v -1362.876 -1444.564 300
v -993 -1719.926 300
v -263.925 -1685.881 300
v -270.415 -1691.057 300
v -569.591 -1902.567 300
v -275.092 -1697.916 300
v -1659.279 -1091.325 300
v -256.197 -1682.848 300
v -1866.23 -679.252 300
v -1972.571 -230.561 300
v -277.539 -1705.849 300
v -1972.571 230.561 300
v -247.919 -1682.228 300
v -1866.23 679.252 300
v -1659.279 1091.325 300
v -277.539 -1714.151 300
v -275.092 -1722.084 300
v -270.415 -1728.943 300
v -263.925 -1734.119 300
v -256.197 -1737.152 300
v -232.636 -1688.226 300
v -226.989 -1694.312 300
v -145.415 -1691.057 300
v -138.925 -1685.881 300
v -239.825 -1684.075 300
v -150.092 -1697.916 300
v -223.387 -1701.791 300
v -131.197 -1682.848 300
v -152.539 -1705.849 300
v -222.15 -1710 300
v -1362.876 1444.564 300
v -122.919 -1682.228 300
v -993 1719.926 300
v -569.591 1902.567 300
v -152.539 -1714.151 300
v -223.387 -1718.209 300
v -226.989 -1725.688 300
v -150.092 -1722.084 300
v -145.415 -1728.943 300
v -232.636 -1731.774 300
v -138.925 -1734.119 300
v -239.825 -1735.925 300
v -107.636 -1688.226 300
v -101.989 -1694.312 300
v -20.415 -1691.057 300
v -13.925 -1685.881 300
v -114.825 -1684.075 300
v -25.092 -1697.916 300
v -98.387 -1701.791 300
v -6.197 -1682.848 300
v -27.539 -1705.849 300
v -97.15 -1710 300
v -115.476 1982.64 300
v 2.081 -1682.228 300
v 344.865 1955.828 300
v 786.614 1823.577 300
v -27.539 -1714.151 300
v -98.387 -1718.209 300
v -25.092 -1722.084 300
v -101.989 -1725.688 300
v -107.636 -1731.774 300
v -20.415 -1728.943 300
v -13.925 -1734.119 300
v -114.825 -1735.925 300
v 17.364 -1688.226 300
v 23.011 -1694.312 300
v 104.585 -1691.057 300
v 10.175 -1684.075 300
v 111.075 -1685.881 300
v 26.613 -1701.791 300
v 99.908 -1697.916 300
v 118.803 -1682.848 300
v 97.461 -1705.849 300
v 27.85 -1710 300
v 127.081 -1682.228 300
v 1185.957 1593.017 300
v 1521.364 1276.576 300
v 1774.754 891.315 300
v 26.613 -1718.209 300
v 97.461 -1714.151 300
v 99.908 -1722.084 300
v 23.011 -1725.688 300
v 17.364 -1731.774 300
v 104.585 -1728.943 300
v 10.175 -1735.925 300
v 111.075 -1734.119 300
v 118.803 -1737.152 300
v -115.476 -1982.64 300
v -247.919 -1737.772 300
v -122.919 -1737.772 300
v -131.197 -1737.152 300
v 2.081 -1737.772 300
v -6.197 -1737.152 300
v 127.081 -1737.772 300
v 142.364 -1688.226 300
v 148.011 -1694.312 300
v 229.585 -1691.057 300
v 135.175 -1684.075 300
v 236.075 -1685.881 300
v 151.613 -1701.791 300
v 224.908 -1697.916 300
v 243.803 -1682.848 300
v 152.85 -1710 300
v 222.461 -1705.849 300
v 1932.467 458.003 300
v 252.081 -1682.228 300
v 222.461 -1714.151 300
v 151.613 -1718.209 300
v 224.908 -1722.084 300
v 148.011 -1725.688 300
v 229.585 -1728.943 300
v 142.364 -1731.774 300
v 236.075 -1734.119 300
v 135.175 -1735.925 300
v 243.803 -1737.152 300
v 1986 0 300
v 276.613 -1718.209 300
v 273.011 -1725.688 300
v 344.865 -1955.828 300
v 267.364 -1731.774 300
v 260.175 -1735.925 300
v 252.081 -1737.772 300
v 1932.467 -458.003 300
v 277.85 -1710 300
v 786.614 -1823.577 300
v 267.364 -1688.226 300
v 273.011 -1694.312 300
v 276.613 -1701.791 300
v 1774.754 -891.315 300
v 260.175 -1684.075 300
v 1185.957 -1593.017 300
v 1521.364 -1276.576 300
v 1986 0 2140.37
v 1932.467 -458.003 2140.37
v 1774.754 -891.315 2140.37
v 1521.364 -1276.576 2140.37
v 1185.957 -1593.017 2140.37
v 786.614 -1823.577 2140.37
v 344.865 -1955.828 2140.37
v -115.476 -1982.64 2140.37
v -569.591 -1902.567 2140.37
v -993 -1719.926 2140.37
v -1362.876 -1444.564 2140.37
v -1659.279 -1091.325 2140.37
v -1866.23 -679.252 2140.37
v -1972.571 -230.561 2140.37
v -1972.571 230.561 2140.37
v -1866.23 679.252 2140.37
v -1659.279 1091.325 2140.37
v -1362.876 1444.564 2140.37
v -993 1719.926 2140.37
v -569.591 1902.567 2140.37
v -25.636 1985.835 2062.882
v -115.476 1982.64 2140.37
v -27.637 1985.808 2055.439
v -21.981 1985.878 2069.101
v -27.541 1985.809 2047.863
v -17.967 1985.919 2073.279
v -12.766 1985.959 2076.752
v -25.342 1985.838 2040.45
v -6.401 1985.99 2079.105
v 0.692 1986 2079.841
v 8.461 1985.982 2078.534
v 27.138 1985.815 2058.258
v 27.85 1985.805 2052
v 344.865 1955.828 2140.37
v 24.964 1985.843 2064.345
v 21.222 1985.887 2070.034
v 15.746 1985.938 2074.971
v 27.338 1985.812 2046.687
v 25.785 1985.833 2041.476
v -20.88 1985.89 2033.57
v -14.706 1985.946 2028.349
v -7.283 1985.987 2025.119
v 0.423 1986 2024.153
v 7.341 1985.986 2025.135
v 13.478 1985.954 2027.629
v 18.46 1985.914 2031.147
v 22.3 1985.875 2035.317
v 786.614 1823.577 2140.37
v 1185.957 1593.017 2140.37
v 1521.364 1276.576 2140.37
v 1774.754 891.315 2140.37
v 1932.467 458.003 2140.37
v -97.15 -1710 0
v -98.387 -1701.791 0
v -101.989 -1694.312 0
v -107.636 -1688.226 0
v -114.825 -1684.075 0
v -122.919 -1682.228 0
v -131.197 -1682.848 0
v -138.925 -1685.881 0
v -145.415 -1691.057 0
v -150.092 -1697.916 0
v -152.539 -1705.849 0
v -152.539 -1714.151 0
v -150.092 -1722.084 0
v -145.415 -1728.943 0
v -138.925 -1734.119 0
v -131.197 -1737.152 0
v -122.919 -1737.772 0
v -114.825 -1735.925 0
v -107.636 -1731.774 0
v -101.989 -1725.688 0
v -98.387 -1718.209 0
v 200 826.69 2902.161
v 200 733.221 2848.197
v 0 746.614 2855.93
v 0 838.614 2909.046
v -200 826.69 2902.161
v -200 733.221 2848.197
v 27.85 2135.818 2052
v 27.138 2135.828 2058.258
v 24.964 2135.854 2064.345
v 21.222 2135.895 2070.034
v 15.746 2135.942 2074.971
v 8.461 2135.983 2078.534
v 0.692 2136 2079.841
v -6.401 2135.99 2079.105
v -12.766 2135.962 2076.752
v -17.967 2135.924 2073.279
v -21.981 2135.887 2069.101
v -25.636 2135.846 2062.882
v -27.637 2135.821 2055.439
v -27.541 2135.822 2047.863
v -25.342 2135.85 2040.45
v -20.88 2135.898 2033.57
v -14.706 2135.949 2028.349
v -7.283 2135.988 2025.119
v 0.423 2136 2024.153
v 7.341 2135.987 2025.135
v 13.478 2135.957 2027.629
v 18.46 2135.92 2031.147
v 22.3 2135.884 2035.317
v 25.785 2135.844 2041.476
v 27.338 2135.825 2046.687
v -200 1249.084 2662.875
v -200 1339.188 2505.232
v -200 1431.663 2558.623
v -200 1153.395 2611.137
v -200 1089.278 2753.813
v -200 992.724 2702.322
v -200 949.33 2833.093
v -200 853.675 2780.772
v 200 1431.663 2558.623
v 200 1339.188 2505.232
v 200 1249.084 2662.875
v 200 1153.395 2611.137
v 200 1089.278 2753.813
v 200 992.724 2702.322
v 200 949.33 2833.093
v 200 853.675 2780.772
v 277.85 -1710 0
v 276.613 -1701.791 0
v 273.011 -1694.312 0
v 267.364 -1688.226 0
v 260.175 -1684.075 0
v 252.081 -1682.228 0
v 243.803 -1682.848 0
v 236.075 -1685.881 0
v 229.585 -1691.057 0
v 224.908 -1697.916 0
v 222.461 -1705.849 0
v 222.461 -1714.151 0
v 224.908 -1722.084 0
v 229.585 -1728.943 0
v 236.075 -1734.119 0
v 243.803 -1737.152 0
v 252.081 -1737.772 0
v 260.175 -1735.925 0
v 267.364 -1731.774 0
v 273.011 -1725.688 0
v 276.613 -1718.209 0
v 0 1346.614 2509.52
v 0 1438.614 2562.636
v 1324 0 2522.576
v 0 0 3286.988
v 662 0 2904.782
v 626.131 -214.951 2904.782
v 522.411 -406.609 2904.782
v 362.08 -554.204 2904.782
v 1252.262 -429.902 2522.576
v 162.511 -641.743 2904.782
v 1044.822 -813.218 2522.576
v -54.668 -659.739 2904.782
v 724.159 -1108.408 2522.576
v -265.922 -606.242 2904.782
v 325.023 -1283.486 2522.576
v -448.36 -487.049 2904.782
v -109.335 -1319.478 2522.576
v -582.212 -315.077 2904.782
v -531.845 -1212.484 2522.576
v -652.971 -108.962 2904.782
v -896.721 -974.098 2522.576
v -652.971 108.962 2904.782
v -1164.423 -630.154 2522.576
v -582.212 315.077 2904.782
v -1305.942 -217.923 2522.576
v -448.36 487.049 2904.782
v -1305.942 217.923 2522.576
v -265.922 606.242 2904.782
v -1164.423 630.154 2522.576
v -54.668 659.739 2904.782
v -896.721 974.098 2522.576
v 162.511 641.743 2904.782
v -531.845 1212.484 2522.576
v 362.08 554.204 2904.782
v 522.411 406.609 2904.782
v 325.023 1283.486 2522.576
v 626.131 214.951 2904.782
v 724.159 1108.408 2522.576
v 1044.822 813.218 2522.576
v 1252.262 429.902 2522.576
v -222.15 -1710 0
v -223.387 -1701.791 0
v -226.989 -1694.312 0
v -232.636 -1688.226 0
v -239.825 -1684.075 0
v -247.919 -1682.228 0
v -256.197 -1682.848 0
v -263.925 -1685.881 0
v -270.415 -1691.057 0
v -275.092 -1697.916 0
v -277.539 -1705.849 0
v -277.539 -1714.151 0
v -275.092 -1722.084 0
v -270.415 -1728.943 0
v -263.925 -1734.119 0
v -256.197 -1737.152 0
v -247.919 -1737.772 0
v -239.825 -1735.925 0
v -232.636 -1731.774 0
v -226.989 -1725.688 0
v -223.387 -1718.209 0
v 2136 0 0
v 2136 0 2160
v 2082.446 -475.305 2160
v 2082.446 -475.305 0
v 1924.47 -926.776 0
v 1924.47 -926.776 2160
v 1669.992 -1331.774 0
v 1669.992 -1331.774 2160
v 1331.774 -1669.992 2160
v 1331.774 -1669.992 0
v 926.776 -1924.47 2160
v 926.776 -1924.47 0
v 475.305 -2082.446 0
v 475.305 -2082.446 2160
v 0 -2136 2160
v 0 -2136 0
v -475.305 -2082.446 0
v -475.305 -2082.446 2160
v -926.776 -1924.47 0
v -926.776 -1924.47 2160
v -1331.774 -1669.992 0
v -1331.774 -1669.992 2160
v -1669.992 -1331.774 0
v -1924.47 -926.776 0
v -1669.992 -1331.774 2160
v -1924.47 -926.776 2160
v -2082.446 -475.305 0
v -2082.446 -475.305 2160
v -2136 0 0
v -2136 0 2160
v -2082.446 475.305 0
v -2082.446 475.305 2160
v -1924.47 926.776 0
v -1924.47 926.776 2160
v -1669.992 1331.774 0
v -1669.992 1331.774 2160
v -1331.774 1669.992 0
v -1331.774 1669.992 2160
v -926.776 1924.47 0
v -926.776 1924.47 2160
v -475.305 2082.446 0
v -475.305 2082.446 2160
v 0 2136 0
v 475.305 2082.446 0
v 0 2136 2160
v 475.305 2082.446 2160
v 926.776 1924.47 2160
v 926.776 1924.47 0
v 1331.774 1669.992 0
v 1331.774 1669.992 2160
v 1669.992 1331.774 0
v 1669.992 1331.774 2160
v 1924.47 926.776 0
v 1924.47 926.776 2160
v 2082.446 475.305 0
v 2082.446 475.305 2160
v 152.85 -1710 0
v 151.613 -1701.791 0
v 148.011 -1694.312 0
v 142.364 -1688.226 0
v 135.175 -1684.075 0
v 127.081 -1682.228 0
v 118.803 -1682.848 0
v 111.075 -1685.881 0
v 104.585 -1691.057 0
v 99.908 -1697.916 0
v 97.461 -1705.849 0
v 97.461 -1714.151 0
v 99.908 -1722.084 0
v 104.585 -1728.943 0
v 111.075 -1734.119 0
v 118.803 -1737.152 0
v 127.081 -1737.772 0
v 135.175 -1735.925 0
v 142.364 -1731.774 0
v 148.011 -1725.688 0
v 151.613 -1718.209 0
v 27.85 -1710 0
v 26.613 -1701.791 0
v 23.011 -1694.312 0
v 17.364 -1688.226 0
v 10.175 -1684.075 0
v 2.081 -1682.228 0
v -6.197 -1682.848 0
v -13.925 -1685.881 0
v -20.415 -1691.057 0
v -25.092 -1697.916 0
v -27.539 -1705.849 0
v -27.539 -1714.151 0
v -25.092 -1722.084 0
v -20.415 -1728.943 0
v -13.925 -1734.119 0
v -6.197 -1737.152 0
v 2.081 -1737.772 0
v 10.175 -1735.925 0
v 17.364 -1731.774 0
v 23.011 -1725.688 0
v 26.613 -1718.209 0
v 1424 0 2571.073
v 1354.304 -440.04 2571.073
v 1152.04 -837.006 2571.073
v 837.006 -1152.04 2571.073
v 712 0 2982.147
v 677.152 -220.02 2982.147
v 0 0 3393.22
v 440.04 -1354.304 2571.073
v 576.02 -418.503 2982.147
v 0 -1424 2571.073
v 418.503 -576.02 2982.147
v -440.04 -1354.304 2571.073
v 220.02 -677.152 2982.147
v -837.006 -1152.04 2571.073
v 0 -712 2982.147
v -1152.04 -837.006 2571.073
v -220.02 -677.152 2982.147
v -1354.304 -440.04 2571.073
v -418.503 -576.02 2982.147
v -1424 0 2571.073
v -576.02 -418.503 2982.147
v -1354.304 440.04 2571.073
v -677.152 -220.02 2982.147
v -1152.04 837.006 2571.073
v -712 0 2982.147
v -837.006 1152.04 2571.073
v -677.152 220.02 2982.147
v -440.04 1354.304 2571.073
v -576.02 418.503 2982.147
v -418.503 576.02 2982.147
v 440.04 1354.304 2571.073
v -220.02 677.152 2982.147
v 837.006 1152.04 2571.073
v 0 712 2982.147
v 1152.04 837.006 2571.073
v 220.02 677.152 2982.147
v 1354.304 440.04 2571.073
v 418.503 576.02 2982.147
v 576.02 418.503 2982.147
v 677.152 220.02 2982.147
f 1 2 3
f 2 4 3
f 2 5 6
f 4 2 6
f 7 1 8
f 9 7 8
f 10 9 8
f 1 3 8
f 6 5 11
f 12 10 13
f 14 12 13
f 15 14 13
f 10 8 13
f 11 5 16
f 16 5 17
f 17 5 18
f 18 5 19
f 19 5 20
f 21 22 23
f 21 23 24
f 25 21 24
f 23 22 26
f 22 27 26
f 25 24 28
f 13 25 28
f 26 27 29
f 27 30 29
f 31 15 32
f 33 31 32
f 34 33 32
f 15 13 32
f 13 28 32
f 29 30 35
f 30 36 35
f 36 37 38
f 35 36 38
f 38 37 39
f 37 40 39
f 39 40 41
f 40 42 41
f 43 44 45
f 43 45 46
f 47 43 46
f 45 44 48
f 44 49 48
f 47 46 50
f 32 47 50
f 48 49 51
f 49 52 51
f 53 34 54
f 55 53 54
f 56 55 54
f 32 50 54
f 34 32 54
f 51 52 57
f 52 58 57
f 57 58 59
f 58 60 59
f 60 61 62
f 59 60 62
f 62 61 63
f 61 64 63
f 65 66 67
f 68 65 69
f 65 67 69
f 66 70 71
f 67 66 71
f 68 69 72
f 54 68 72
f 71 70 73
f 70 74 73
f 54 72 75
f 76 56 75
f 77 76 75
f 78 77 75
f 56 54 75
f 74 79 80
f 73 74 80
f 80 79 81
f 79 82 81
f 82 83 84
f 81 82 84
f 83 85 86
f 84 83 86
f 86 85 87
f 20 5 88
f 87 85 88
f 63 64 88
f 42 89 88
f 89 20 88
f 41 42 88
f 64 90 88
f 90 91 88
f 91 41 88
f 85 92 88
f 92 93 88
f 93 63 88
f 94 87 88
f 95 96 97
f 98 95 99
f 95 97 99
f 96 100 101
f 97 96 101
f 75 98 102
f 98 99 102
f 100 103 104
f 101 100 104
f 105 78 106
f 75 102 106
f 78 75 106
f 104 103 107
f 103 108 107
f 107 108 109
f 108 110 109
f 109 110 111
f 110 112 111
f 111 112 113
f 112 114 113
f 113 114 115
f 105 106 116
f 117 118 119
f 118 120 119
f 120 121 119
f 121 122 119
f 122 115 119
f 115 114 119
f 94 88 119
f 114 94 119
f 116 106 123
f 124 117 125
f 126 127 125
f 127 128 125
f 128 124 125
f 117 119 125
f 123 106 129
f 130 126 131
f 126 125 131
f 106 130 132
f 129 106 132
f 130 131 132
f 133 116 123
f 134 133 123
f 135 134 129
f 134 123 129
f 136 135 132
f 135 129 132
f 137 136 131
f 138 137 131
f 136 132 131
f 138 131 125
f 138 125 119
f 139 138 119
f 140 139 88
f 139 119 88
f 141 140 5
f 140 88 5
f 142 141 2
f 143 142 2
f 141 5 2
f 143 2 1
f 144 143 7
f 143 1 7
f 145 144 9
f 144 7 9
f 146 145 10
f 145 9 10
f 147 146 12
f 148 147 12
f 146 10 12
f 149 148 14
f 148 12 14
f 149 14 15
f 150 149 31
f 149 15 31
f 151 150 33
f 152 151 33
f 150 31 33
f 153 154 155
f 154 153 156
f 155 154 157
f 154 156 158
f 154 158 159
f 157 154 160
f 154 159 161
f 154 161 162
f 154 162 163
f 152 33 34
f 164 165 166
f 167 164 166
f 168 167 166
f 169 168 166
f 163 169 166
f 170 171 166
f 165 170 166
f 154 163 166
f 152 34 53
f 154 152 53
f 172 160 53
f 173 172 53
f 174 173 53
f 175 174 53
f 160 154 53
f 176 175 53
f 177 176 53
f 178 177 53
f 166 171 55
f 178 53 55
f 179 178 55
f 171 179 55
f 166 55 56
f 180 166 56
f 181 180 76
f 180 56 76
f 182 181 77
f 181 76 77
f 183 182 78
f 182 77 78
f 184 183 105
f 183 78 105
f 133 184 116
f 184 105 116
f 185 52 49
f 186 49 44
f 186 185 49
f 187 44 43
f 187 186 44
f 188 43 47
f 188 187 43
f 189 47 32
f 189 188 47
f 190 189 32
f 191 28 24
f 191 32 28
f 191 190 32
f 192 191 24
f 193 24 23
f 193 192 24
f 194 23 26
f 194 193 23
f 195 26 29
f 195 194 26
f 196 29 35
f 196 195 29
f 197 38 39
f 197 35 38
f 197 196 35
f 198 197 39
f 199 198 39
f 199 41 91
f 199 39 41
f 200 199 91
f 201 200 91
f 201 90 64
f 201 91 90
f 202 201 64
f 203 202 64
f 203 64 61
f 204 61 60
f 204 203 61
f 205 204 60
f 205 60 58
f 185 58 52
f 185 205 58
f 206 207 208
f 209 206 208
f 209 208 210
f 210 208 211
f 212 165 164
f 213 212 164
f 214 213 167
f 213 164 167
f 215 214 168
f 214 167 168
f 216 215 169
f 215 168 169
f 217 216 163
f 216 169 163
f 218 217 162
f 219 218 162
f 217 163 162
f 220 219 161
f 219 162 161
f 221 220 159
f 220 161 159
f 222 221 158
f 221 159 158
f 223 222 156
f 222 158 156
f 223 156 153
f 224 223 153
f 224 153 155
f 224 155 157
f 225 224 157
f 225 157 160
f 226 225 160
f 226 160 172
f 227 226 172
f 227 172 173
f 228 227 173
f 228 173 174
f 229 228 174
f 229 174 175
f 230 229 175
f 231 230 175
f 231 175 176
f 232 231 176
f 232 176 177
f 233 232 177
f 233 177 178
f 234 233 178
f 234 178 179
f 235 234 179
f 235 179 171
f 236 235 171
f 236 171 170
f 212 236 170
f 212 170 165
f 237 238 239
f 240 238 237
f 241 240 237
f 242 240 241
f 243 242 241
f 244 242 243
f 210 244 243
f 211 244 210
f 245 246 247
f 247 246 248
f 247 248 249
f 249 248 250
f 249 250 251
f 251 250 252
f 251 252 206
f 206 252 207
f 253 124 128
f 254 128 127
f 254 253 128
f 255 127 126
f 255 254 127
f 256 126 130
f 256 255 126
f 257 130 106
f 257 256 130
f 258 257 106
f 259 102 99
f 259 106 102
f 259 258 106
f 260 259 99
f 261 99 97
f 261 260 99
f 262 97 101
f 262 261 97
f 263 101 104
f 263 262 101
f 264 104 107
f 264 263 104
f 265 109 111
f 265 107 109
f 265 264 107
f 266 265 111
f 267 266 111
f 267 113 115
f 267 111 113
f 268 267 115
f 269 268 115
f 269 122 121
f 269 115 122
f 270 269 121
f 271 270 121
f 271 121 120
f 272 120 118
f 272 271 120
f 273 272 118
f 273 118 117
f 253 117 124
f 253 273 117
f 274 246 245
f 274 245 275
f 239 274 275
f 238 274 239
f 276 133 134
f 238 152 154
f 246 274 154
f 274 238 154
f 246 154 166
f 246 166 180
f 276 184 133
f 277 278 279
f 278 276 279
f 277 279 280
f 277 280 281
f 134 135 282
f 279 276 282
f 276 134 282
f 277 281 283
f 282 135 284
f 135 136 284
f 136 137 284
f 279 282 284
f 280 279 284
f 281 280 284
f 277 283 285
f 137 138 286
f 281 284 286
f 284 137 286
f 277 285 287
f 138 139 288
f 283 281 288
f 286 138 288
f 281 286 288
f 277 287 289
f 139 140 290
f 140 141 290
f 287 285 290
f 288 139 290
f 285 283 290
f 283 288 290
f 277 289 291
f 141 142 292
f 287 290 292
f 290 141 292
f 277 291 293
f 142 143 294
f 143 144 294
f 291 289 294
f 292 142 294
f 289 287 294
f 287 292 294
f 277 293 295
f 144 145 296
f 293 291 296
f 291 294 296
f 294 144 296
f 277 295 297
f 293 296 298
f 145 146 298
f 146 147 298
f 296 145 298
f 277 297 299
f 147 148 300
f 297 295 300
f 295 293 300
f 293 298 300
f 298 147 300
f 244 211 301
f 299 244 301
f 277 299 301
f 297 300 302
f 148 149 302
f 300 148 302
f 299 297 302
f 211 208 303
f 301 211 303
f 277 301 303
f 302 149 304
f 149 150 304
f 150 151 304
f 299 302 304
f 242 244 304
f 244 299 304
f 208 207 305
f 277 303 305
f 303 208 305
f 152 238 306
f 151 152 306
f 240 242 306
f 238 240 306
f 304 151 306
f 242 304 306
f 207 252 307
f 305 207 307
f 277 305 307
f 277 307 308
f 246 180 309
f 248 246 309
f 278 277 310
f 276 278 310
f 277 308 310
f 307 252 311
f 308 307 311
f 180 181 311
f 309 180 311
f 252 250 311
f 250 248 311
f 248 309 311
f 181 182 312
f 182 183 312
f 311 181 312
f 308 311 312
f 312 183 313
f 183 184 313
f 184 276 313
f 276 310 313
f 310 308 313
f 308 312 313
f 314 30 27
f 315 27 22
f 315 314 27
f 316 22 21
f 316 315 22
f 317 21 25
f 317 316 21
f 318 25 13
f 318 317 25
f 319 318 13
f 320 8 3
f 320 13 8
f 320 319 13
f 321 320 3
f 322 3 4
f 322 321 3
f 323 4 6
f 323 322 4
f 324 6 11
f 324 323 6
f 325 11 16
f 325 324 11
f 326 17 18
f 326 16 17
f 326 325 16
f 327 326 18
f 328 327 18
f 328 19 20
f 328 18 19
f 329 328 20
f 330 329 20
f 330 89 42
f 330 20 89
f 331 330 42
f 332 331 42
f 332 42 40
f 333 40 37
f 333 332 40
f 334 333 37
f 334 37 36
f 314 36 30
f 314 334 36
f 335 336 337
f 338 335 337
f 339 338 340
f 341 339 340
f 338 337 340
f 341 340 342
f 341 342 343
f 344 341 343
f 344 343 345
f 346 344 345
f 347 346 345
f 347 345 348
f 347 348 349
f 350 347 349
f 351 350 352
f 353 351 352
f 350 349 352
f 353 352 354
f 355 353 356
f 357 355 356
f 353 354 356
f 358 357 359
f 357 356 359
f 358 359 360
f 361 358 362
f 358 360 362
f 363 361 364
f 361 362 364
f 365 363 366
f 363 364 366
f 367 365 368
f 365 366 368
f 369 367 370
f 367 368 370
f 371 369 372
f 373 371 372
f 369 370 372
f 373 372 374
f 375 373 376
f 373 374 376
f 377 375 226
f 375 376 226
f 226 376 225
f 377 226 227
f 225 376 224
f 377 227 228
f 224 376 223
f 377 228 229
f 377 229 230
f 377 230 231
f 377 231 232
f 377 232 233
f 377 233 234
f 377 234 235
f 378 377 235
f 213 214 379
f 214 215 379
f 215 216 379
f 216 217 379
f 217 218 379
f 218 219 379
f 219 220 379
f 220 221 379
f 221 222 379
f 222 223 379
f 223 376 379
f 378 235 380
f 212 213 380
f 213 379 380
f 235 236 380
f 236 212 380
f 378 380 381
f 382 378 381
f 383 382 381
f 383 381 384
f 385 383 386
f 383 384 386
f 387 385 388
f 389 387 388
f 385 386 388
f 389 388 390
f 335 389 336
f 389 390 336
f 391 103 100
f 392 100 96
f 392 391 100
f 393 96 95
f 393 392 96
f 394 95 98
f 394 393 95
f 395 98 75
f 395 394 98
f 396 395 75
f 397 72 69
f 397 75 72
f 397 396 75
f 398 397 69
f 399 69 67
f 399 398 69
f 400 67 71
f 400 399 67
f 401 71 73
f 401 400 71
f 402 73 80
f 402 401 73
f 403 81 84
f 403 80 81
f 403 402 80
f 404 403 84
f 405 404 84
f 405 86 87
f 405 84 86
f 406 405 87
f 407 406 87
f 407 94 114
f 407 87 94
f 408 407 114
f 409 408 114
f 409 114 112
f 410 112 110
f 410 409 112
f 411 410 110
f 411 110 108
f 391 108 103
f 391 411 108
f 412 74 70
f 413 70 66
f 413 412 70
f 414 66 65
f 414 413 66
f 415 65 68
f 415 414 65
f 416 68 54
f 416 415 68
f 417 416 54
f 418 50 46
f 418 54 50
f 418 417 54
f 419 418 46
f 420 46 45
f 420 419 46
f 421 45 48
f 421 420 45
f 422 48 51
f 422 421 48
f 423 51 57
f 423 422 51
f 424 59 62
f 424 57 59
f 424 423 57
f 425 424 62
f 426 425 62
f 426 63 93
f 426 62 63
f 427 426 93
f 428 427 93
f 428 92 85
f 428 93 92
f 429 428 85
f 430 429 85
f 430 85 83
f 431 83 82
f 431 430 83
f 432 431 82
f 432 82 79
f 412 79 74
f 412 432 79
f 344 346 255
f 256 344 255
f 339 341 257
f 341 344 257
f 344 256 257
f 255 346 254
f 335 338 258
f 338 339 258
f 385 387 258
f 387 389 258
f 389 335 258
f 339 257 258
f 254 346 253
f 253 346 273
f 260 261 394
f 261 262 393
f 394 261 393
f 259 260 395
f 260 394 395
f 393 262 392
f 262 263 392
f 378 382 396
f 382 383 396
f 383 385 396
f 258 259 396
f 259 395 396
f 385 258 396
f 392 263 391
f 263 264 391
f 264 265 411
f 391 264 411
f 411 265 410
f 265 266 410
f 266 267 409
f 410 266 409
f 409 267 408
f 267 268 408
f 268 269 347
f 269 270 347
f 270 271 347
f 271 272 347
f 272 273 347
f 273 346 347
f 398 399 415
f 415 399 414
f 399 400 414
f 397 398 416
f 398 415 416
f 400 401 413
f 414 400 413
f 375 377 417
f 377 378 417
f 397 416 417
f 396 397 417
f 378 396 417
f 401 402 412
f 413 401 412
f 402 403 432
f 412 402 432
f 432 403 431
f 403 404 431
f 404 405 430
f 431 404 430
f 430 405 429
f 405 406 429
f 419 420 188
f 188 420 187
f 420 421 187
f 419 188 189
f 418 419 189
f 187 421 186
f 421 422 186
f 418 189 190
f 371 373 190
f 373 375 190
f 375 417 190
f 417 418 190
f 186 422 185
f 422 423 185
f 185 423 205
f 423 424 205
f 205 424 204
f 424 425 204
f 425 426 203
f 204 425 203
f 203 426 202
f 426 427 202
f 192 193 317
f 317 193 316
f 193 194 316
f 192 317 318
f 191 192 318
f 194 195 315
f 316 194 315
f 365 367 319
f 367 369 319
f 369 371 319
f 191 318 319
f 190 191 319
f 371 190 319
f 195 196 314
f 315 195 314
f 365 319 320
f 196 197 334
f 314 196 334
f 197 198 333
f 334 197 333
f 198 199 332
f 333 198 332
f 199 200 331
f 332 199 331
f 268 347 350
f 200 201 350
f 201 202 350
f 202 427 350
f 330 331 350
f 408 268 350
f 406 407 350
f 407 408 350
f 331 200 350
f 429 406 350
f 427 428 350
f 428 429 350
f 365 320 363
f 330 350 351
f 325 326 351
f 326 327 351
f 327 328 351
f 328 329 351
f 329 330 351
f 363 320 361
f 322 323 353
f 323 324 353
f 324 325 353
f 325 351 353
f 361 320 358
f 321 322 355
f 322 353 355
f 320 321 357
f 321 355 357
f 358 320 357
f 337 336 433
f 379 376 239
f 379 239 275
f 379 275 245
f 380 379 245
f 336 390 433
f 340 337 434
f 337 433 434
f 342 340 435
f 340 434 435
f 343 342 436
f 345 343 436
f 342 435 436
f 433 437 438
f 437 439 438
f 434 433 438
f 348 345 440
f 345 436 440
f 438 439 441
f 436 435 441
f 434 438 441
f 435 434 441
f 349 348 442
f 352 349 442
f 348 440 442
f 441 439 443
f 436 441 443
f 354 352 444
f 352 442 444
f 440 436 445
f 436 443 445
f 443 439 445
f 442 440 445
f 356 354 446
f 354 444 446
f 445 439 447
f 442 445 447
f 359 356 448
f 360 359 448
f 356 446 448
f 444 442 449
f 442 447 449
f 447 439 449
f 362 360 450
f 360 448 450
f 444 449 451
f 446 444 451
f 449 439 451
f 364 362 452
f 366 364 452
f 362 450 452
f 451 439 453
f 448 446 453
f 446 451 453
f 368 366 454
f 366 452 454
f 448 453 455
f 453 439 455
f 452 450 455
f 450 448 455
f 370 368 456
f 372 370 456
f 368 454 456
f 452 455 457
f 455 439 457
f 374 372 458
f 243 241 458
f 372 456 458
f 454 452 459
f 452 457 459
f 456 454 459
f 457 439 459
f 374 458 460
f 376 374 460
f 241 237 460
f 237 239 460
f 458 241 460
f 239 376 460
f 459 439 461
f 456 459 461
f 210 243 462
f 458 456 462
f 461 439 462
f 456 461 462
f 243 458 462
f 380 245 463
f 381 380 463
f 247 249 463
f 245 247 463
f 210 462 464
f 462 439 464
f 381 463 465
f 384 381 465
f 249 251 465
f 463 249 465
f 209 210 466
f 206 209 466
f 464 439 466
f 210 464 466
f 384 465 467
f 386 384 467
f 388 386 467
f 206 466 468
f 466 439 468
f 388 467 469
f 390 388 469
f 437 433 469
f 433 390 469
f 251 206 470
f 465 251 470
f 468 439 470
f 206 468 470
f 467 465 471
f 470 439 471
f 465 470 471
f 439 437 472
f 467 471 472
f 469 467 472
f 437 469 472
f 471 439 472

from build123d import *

# Parameters (mm, degrees)
F2_W     = 400
F2_H     = 600
F5_DEPTH = 30000
F3_R     = 27.85
F6_DEPTH = 500
F7_R     = 27.85
F8_DEPTH = 2136.001


with BuildPart() as f4:
    # F0 (on Front) → F4 (revolve)
    with BuildSketch(Plane.XZ):
        Polygon((0, 300), (0, 0), (2136, 0), (2136, 2160), (0, 3393.220175), (0, 3286.987725), (1986, 2140.370091), (1986, 300), align=None)
    revolve(axis=Axis((0, 0, 150), (0, 0, -1)))

    # F2 (on face) → F5 (cut)
    with BuildSketch(Plane(origin=(0, 0, 0), x_dir=(-1, 0, 0), z_dir=(0, 0.866025, 0.5))):
        with Locations((0, 1800)):
            Rectangle(F2_W, F2_H)
    extrude(amount=F5_DEPTH, mode=Mode.SUBTRACT)

    # F3 (on Top) → F6 (cut)
    with BuildSketch(Plane.XY):
        with Locations((125, -1710)):
            Circle(F3_R)
        with Locations((0, -1710)):
            Circle(F3_R)
        with Locations((-125, -1710)):
            Circle(F3_R)
        with Locations((-250, -1710)):
            Circle(F3_R)
        with Locations((250, -1710)):
            Circle(F3_R)
    extrude(amount=F6_DEPTH, mode=Mode.SUBTRACT)

    # F7 (on Front) → F8 (cut, through all)
    with BuildSketch(Plane.XZ):
        with Locations((0, 2052)):
            Circle(F7_R)
    extrude(amount=-F8_DEPTH, mode=Mode.SUBTRACT)


solid = f4.part
